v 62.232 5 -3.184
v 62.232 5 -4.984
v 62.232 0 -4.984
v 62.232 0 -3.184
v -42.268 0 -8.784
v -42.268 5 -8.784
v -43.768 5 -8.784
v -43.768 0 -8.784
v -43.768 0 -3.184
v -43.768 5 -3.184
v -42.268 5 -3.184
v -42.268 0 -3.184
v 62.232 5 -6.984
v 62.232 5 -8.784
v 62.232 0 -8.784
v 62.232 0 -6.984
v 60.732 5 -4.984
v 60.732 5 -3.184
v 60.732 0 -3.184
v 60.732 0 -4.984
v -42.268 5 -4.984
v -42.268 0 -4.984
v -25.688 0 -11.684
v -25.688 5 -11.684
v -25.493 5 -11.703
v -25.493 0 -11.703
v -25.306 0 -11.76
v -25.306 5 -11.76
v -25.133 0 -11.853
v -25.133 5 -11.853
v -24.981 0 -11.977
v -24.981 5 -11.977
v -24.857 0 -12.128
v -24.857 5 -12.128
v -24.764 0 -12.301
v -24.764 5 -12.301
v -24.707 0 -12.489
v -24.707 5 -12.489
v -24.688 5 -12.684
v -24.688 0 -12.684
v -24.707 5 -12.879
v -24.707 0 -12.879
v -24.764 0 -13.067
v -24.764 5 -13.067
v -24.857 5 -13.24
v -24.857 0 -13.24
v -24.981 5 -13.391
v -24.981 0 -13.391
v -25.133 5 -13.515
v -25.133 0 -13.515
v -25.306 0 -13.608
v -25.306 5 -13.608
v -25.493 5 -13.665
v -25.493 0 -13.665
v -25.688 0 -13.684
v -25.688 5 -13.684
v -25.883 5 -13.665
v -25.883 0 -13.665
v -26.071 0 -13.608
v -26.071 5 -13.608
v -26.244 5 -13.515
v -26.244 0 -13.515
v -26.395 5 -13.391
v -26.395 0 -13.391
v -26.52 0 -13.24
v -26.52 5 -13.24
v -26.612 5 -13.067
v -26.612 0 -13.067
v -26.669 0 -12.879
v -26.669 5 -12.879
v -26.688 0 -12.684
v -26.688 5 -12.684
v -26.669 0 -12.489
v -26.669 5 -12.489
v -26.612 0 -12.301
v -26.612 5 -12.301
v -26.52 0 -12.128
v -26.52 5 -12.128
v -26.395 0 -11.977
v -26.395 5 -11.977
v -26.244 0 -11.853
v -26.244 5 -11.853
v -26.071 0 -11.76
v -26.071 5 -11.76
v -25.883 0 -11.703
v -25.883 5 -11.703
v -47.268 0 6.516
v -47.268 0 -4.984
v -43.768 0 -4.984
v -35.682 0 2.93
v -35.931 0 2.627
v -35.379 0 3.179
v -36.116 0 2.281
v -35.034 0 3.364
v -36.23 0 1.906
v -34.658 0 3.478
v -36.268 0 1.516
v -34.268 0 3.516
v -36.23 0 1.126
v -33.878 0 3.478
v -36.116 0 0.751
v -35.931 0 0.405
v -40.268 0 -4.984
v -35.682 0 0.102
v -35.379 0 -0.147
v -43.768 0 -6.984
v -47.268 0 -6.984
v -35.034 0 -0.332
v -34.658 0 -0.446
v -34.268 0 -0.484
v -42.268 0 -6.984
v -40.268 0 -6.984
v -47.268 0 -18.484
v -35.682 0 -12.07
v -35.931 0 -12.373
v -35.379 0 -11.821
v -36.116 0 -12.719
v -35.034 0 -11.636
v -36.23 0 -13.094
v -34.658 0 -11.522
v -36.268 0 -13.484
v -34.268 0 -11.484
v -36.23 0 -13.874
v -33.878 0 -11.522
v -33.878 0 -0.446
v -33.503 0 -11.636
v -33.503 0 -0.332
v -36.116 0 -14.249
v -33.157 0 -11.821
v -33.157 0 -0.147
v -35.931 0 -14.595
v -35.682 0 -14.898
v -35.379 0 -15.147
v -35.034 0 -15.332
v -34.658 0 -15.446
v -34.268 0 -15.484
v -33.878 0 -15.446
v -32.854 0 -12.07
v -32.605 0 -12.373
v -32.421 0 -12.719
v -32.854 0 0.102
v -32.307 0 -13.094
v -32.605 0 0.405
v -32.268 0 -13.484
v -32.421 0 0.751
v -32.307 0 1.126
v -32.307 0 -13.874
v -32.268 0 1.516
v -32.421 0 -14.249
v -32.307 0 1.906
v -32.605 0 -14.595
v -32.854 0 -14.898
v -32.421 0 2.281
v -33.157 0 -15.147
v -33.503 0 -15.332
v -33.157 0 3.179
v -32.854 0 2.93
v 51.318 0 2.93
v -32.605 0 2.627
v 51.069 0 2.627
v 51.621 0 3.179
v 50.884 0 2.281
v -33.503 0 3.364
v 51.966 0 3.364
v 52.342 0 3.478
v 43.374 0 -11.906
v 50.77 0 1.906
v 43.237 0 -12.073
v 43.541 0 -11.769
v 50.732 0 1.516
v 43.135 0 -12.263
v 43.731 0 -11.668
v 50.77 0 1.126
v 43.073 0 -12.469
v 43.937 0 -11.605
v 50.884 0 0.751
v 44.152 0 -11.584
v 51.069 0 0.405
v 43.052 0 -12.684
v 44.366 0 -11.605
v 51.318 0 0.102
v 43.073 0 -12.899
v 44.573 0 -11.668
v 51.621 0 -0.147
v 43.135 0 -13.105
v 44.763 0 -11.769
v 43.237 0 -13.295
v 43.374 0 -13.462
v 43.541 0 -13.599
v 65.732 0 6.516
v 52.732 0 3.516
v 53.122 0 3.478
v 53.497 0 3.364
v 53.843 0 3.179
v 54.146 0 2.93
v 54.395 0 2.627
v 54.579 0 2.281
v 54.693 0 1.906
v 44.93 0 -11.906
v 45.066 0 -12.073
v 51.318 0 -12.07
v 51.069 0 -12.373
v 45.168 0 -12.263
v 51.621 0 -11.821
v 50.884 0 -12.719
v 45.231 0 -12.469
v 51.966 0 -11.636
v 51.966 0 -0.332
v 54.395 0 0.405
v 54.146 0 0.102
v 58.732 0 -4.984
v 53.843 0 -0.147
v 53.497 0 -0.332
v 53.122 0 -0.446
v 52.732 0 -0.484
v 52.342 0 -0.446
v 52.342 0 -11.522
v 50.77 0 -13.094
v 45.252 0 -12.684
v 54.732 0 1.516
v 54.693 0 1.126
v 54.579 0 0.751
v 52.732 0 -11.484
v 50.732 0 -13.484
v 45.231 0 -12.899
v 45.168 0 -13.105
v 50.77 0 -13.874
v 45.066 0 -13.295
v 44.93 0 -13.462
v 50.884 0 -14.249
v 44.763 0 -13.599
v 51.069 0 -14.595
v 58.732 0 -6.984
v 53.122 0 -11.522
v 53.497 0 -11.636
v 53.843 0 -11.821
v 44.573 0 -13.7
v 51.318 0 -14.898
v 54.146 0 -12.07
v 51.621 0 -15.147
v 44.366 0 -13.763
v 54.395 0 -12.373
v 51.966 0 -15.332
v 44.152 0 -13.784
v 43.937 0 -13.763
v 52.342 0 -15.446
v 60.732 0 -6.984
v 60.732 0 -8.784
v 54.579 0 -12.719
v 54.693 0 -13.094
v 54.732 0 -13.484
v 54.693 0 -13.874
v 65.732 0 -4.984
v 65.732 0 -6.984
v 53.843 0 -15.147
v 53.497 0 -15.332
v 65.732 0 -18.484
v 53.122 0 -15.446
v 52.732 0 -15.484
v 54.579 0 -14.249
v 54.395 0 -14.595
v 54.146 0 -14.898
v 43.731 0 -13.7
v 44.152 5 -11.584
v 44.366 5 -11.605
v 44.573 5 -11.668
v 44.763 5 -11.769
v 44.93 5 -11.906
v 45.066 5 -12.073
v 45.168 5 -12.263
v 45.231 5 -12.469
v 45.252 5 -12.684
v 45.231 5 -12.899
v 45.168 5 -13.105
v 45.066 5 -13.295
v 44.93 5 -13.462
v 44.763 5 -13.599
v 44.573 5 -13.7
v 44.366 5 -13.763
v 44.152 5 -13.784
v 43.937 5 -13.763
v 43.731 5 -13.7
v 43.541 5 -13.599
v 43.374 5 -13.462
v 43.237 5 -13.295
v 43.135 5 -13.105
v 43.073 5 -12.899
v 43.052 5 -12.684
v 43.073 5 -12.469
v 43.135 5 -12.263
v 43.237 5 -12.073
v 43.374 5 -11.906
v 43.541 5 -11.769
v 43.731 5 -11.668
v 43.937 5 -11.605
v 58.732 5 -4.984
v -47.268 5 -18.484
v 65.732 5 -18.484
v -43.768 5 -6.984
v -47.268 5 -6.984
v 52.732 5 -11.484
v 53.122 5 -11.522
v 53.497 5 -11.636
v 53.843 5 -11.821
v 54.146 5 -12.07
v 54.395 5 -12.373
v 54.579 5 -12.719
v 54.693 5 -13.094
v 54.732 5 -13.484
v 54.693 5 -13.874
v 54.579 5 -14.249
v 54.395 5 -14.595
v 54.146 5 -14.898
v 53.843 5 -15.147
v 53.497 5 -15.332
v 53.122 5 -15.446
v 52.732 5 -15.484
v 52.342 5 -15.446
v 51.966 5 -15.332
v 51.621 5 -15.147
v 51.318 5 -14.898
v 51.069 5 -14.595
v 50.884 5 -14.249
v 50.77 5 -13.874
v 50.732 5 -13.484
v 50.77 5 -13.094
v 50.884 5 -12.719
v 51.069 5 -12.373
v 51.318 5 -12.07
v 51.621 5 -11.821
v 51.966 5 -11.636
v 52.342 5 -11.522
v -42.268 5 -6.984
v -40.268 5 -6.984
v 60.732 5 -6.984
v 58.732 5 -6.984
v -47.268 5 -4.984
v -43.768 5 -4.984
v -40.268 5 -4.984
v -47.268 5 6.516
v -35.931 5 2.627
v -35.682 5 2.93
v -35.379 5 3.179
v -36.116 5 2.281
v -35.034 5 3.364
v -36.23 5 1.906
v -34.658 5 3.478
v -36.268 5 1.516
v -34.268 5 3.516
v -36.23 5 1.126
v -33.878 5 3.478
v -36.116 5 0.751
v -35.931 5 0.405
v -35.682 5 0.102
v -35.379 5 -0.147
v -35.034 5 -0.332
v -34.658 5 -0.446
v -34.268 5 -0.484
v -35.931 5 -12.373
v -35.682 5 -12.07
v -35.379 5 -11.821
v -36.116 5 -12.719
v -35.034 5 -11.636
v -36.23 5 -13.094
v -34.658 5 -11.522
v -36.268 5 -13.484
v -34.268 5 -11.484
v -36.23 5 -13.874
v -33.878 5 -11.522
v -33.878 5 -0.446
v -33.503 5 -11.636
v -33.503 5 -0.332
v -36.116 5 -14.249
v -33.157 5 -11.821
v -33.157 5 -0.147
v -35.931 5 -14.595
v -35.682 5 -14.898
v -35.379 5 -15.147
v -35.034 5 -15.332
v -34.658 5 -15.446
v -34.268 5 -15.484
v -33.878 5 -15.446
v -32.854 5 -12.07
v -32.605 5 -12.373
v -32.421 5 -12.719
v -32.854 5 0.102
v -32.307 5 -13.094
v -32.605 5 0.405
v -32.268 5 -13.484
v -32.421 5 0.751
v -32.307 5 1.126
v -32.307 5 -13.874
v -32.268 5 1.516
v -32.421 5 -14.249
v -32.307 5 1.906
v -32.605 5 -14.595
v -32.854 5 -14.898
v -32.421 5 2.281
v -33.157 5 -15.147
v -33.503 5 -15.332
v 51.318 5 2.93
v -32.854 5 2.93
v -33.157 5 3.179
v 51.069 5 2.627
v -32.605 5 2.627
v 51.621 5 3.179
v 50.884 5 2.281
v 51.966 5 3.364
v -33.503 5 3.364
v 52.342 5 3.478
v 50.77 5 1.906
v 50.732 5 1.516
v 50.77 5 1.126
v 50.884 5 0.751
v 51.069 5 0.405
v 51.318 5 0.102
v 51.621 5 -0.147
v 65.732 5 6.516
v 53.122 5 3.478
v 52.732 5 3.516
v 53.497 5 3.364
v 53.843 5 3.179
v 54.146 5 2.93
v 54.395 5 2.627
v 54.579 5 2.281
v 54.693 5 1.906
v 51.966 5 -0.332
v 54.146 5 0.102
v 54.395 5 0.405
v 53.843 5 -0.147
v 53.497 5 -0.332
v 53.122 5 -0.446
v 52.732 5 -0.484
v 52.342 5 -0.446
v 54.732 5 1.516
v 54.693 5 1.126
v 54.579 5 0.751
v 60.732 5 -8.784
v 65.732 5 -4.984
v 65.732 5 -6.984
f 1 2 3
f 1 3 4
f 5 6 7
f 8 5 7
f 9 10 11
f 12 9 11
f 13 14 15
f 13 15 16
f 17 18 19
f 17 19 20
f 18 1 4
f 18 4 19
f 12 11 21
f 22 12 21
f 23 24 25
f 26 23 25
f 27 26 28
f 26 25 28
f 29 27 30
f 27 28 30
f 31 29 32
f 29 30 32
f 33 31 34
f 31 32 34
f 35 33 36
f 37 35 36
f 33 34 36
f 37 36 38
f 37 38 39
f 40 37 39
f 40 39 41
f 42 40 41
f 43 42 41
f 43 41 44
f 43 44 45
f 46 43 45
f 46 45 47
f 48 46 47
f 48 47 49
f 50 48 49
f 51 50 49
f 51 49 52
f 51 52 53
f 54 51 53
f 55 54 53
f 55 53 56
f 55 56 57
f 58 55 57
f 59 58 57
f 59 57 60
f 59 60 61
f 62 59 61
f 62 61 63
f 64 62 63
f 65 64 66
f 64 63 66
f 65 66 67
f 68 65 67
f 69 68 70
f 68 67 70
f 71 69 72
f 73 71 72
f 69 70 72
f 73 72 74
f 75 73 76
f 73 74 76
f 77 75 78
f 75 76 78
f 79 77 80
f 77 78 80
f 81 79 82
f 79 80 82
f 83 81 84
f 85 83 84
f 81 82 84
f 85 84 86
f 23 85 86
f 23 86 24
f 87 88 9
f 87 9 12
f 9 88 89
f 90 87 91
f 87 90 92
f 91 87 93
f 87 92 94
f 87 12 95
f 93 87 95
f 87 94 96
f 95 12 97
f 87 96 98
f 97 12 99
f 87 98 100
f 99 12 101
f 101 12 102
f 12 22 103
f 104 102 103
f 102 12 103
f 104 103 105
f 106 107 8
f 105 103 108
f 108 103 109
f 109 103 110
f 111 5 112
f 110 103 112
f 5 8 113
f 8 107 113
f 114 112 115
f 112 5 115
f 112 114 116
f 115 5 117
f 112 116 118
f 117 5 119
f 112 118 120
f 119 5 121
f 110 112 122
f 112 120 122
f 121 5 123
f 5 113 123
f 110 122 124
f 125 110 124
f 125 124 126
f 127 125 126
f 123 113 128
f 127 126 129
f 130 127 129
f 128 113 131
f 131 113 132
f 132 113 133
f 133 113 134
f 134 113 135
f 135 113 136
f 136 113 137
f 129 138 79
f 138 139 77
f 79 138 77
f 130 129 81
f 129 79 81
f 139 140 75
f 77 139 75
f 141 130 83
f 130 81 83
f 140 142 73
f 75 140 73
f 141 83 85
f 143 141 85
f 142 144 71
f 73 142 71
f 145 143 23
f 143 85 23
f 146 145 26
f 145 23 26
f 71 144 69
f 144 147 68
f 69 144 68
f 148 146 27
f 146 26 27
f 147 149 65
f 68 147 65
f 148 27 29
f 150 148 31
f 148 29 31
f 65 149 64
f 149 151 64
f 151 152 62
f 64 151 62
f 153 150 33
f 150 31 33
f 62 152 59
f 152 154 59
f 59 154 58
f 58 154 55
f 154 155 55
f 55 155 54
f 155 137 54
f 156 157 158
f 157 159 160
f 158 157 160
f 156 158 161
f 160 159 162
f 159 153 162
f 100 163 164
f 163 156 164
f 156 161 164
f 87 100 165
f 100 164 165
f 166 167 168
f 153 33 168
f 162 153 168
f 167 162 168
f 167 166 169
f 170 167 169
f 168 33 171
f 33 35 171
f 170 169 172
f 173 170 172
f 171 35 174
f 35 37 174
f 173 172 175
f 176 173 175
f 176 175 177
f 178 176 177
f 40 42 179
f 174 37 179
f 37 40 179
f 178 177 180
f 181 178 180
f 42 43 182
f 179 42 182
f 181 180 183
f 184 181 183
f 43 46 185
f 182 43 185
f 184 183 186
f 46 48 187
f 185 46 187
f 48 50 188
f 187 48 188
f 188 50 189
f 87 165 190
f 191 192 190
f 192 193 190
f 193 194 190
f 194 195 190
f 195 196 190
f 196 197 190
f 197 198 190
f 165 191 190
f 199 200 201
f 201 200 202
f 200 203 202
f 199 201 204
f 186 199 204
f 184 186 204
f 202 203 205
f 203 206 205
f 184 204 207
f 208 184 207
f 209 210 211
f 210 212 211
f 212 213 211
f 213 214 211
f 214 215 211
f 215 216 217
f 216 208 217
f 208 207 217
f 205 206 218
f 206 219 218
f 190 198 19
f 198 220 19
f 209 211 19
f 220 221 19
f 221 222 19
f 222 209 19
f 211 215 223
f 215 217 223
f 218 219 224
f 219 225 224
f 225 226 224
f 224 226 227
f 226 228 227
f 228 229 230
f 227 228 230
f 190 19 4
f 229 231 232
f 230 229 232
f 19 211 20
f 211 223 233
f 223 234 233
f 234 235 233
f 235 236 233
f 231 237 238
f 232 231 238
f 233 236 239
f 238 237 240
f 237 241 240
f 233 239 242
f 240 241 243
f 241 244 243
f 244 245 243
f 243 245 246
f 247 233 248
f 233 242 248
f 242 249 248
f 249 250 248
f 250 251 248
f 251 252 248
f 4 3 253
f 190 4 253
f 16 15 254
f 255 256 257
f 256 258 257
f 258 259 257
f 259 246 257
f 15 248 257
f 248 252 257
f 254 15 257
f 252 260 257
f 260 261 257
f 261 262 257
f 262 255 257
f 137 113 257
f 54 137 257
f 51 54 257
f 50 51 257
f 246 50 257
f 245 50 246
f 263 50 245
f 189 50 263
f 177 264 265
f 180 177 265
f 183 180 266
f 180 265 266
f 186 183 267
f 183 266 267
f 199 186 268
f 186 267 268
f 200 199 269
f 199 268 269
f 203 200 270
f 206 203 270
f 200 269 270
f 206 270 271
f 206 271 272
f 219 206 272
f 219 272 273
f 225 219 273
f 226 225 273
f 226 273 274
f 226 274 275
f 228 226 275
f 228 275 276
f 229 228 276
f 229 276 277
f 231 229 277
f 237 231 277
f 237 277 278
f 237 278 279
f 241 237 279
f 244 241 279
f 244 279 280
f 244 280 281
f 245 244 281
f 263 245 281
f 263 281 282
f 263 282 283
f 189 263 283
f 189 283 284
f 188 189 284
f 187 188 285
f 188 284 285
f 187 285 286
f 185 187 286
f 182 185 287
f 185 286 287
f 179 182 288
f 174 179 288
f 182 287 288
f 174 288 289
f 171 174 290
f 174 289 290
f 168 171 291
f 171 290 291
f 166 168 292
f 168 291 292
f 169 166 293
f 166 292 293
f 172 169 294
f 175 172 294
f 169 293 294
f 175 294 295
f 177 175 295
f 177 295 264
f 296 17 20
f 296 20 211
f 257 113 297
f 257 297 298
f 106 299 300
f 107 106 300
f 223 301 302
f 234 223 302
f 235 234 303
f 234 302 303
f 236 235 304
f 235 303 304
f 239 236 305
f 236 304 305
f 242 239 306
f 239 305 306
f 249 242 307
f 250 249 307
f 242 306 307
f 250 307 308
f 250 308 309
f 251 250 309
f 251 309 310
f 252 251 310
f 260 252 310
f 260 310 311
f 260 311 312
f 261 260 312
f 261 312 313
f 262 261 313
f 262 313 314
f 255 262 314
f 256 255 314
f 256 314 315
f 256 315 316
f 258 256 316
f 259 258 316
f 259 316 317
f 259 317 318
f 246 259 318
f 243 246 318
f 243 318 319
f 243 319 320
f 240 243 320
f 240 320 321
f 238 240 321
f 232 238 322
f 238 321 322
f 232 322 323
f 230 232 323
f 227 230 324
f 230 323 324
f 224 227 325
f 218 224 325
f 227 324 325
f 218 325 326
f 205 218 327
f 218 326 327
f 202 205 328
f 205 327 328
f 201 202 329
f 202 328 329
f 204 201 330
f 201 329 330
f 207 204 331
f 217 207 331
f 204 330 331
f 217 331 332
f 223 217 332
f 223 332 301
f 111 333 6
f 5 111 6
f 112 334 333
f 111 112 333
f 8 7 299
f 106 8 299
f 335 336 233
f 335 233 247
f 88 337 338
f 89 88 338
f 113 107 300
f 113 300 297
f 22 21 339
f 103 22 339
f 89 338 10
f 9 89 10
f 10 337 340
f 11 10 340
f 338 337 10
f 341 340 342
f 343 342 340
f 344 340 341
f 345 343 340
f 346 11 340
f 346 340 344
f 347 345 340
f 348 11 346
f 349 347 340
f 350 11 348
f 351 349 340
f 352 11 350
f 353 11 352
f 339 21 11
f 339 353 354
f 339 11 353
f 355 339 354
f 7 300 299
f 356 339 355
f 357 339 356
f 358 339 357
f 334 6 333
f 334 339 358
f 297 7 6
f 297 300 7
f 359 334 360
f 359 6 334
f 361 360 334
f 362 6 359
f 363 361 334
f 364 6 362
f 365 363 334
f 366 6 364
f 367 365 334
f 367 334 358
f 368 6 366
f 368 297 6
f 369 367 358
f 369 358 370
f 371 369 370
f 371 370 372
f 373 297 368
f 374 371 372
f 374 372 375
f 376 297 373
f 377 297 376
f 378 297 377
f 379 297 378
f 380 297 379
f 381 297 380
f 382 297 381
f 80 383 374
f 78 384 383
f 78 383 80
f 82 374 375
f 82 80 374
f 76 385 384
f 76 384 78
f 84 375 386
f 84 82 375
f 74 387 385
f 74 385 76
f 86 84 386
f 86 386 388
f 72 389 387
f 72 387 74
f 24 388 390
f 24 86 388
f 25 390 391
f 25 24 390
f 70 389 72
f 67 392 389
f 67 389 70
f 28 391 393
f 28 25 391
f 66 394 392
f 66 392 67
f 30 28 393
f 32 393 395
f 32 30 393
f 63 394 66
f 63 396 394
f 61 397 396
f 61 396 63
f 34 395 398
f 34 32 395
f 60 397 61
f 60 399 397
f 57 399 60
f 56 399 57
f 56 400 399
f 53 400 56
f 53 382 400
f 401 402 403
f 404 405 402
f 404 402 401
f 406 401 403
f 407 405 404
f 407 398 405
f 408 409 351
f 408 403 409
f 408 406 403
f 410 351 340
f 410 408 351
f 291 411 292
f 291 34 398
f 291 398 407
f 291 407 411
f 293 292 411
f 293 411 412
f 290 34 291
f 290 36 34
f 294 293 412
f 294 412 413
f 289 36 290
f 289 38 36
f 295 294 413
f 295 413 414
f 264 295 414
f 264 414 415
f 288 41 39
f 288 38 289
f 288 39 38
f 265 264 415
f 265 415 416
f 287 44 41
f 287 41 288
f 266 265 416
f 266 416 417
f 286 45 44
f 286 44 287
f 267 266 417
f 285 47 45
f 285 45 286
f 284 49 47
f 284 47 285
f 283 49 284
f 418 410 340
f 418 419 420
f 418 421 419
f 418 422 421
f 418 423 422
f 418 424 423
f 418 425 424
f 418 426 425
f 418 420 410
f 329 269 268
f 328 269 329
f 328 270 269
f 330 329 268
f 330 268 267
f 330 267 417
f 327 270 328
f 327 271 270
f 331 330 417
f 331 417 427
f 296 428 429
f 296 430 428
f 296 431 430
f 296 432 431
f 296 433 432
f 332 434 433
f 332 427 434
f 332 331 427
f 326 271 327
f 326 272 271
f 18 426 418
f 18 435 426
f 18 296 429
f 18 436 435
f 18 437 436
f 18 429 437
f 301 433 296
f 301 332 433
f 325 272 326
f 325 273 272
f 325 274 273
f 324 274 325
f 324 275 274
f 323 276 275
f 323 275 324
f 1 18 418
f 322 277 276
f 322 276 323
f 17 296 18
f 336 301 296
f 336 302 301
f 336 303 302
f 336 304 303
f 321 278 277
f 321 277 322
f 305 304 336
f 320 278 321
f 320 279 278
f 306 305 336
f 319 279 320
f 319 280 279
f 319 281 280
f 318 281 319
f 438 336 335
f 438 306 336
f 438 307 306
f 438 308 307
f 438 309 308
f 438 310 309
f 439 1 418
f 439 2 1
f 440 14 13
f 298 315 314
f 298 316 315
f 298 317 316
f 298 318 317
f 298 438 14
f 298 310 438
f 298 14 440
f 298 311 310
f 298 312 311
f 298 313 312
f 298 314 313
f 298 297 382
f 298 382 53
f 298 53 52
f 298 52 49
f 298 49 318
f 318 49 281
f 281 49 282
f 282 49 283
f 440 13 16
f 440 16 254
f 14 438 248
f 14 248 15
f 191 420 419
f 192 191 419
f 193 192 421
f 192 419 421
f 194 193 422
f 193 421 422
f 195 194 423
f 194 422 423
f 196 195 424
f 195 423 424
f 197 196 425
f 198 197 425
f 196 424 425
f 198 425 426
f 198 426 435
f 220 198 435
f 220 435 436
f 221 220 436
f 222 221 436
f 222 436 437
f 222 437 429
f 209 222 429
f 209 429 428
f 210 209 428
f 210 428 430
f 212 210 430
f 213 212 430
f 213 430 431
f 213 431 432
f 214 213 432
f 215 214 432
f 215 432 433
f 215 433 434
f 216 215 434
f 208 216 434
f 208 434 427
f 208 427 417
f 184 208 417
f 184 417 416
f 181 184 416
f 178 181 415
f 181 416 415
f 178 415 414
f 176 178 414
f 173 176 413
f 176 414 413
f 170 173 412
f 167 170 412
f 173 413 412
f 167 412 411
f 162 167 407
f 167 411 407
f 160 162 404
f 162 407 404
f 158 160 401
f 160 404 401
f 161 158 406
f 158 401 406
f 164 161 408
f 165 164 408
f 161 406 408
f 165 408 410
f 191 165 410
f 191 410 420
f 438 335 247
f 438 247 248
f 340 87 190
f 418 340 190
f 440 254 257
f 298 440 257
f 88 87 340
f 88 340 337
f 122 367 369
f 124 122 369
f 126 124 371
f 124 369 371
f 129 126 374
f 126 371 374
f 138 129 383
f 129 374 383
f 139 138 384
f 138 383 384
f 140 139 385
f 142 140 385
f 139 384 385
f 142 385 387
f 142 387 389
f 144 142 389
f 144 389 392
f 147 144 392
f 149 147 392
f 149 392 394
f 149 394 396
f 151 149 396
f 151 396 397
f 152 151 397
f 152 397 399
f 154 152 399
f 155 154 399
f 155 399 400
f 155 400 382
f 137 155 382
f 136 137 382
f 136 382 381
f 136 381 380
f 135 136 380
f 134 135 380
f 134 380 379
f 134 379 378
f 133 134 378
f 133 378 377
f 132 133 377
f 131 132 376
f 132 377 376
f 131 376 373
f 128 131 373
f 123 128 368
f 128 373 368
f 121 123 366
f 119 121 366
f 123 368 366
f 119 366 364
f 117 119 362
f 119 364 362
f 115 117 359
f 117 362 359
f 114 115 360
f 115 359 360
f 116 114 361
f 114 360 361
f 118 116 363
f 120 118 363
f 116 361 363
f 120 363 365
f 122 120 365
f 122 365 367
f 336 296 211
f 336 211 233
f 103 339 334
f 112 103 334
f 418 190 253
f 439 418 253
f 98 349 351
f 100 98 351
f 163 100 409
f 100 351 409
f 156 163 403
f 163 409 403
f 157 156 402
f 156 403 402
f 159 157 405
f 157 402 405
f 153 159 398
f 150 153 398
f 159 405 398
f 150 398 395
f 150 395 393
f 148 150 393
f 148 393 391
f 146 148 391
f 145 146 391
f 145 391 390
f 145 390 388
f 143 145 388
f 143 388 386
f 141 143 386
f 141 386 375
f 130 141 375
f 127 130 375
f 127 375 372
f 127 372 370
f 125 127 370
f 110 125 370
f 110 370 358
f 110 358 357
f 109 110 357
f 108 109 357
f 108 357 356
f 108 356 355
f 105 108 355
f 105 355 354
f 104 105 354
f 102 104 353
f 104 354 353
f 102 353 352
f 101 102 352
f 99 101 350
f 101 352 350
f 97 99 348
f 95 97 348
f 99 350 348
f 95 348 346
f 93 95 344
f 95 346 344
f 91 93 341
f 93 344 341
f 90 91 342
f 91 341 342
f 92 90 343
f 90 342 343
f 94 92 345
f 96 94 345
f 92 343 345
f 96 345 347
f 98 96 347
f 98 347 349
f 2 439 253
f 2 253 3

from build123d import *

# Parameters (mm, degrees)
ESBO_O1_W                = 113
ESBO_O1_H                = 25
RESSALTO_EXTRUS_O1_DEPTH = 5
CORTE_EXTRUS_O1_DEPTH    = 5
ESBO_O4_R                = 1
ESBO_O4_R_2              = 1.1
CORTE_EXTRUS_O2_DEPTH    = 76
ESBO_O5_R                = 2
CORTE_EXTRUS_O3_DEPTH    = 10


with BuildPart() as part:
    # Esboço1 → Ressalto-extrusão1 (new body)
    with BuildSketch(Plane(origin=(0, 0, 0), x_dir=(1, 0, 0), z_dir=(0, 1, 0))):
        with Locations((9.231716451, 5.983979594)):
            Rectangle(ESBO_O1_W, ESBO_O1_H)
    extrude(amount=RESSALTO_EXTRUS_O1_DEPTH)

    # Esboço2 → Corte-extrusão1 (cut)
    with BuildSketch(Plane(origin=(0, 5, 0), x_dir=(1, 0, 0), z_dir=(0, 1, 0))):
        Polygon((65.731716451, 4.983979594), (62.231716451, 4.983979594), (62.231716451, 3.183979594), (60.731716451, 3.183979594), (60.731716451, 4.983979594), (58.731716451, 4.983979594), (58.731716451, 6.983979594), (60.731716451, 6.983979594), (60.731716451, 8.783979594), (62.231716451, 8.783979594), (62.231716451, 6.983979594), (65.731716451, 6.983979594), align=None)
    corte_extrus_o1 = extrude(amount=-CORTE_EXTRUS_O1_DEPTH, mode=Mode.SUBTRACT)

    # Espelhar1: Corte-extrusão1 across plane
    add(corte_extrus_o1.mirror(Plane(origin=(9.231716451, 0, 0), x_dir=(0, 0, 1), z_dir=(1, 0, 0))), mode=Mode.SUBTRACT)

    # Esboço4 → Corte-extrusão2 (cut)
    with BuildSketch(Plane(origin=(0, 5, 0), x_dir=(1, 0, 0), z_dir=(0, 1, 0))):
        with Locations(Location((-25.688283549, 12.683979594, 0), (0, 0, 270))):
            Circle(ESBO_O4_R)
        with Locations(Location((44.151716451, 12.683979594, 0), (0, 0, 270))):
            Circle(ESBO_O4_R_2)
    extrude(amount=-CORTE_EXTRUS_O2_DEPTH, mode=Mode.SUBTRACT)

    # Esboço5 → Corte-extrusão3 (cut)
    with BuildSketch(Plane(origin=(0, 5, 0), x_dir=(1, 0, 0), z_dir=(0, 1, 0))):
        with Locations(Location((-34.268283549, 13.483979594, 0), (0, 0, 270))):
            Circle(ESBO_O5_R)
        with Locations(Location((-34.268283549, -1.516020406, 0), (0, 0, 270))):
            Circle(ESBO_O5_R)
        with Locations(Location((52.731716451, 13.483979594, 0), (0, 0, 270))):
            Circle(ESBO_O5_R)
        with Locations(Location((52.731716451, -1.516020406, 0), (0, 0, 270))):
            Circle(ESBO_O5_R)
    extrude(amount=-CORTE_EXTRUS_O3_DEPTH, mode=Mode.SUBTRACT)


solid = part.part
